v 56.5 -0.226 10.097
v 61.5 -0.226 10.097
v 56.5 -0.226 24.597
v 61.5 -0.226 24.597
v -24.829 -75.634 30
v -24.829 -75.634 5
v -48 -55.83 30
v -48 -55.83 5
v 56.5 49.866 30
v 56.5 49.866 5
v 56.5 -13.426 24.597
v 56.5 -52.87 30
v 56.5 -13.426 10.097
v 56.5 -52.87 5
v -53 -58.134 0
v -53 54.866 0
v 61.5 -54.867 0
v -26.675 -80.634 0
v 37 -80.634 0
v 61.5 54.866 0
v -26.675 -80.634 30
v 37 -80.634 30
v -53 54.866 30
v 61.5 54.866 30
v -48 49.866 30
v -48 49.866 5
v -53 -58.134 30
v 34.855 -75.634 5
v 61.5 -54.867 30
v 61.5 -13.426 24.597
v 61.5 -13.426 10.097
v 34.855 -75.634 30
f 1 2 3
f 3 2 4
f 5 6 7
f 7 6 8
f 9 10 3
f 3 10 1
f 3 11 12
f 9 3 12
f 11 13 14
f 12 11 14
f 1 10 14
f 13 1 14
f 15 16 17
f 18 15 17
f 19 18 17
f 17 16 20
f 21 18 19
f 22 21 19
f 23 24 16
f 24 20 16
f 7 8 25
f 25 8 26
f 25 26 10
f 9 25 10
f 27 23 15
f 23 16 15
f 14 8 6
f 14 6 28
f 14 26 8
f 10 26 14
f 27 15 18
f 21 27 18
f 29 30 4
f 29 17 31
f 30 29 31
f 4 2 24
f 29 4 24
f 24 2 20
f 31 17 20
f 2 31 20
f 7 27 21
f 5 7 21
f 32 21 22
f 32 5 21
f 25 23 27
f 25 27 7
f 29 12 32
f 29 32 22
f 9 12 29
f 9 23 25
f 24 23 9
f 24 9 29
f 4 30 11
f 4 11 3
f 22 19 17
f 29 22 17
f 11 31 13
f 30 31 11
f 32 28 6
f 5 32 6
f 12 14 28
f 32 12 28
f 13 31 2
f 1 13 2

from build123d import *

# Parameters (mm, degrees)
F1_DEPTH = 5
F3_DEPTH = 25
F5_W     = 13.2
F5_H     = 14.5
F6_DEPTH = 25


with BuildPart() as f1:
    # F0 (on Top) → F1 (new body)
    with BuildSketch(Plane.XY):
        Polygon((61.500478, 54.866199), (-52.999522, 54.866199), (-52.999522, -58.133801), (-26.674904, -80.633801), (37.000478, -80.633801), (61.500478, -54.867481), align=None)
    extrude(amount=F1_DEPTH)

    # F2 (on face) → F3 (join)
    with BuildSketch(Plane.XY.offset(5)):
        Polygon((37.000478, -80.633801), (61.500478, -54.867481), (61.500478, 54.866199), (-52.999522, 54.866199), (-52.999522, -58.133801), (-26.674904, -80.633801), align=None)
        Polygon((-47.999522, -55.829878), (-47.999522, 49.866199), (56.500478, 49.866199), (56.500478, -52.869805), (34.855248, -75.633801), (-24.829268, -75.633801), align=None, mode=Mode.SUBTRACT)
    extrude(amount=F3_DEPTH)

    # F5 (on face) → F6 (cut)
    with BuildSketch(Plane.YZ.offset(61.500478)):
        with Locations((-6.826305, 17.346862)):
            Rectangle(F5_W, F5_H)
    extrude(amount=-F6_DEPTH, mode=Mode.SUBTRACT)


solid = f1.part
